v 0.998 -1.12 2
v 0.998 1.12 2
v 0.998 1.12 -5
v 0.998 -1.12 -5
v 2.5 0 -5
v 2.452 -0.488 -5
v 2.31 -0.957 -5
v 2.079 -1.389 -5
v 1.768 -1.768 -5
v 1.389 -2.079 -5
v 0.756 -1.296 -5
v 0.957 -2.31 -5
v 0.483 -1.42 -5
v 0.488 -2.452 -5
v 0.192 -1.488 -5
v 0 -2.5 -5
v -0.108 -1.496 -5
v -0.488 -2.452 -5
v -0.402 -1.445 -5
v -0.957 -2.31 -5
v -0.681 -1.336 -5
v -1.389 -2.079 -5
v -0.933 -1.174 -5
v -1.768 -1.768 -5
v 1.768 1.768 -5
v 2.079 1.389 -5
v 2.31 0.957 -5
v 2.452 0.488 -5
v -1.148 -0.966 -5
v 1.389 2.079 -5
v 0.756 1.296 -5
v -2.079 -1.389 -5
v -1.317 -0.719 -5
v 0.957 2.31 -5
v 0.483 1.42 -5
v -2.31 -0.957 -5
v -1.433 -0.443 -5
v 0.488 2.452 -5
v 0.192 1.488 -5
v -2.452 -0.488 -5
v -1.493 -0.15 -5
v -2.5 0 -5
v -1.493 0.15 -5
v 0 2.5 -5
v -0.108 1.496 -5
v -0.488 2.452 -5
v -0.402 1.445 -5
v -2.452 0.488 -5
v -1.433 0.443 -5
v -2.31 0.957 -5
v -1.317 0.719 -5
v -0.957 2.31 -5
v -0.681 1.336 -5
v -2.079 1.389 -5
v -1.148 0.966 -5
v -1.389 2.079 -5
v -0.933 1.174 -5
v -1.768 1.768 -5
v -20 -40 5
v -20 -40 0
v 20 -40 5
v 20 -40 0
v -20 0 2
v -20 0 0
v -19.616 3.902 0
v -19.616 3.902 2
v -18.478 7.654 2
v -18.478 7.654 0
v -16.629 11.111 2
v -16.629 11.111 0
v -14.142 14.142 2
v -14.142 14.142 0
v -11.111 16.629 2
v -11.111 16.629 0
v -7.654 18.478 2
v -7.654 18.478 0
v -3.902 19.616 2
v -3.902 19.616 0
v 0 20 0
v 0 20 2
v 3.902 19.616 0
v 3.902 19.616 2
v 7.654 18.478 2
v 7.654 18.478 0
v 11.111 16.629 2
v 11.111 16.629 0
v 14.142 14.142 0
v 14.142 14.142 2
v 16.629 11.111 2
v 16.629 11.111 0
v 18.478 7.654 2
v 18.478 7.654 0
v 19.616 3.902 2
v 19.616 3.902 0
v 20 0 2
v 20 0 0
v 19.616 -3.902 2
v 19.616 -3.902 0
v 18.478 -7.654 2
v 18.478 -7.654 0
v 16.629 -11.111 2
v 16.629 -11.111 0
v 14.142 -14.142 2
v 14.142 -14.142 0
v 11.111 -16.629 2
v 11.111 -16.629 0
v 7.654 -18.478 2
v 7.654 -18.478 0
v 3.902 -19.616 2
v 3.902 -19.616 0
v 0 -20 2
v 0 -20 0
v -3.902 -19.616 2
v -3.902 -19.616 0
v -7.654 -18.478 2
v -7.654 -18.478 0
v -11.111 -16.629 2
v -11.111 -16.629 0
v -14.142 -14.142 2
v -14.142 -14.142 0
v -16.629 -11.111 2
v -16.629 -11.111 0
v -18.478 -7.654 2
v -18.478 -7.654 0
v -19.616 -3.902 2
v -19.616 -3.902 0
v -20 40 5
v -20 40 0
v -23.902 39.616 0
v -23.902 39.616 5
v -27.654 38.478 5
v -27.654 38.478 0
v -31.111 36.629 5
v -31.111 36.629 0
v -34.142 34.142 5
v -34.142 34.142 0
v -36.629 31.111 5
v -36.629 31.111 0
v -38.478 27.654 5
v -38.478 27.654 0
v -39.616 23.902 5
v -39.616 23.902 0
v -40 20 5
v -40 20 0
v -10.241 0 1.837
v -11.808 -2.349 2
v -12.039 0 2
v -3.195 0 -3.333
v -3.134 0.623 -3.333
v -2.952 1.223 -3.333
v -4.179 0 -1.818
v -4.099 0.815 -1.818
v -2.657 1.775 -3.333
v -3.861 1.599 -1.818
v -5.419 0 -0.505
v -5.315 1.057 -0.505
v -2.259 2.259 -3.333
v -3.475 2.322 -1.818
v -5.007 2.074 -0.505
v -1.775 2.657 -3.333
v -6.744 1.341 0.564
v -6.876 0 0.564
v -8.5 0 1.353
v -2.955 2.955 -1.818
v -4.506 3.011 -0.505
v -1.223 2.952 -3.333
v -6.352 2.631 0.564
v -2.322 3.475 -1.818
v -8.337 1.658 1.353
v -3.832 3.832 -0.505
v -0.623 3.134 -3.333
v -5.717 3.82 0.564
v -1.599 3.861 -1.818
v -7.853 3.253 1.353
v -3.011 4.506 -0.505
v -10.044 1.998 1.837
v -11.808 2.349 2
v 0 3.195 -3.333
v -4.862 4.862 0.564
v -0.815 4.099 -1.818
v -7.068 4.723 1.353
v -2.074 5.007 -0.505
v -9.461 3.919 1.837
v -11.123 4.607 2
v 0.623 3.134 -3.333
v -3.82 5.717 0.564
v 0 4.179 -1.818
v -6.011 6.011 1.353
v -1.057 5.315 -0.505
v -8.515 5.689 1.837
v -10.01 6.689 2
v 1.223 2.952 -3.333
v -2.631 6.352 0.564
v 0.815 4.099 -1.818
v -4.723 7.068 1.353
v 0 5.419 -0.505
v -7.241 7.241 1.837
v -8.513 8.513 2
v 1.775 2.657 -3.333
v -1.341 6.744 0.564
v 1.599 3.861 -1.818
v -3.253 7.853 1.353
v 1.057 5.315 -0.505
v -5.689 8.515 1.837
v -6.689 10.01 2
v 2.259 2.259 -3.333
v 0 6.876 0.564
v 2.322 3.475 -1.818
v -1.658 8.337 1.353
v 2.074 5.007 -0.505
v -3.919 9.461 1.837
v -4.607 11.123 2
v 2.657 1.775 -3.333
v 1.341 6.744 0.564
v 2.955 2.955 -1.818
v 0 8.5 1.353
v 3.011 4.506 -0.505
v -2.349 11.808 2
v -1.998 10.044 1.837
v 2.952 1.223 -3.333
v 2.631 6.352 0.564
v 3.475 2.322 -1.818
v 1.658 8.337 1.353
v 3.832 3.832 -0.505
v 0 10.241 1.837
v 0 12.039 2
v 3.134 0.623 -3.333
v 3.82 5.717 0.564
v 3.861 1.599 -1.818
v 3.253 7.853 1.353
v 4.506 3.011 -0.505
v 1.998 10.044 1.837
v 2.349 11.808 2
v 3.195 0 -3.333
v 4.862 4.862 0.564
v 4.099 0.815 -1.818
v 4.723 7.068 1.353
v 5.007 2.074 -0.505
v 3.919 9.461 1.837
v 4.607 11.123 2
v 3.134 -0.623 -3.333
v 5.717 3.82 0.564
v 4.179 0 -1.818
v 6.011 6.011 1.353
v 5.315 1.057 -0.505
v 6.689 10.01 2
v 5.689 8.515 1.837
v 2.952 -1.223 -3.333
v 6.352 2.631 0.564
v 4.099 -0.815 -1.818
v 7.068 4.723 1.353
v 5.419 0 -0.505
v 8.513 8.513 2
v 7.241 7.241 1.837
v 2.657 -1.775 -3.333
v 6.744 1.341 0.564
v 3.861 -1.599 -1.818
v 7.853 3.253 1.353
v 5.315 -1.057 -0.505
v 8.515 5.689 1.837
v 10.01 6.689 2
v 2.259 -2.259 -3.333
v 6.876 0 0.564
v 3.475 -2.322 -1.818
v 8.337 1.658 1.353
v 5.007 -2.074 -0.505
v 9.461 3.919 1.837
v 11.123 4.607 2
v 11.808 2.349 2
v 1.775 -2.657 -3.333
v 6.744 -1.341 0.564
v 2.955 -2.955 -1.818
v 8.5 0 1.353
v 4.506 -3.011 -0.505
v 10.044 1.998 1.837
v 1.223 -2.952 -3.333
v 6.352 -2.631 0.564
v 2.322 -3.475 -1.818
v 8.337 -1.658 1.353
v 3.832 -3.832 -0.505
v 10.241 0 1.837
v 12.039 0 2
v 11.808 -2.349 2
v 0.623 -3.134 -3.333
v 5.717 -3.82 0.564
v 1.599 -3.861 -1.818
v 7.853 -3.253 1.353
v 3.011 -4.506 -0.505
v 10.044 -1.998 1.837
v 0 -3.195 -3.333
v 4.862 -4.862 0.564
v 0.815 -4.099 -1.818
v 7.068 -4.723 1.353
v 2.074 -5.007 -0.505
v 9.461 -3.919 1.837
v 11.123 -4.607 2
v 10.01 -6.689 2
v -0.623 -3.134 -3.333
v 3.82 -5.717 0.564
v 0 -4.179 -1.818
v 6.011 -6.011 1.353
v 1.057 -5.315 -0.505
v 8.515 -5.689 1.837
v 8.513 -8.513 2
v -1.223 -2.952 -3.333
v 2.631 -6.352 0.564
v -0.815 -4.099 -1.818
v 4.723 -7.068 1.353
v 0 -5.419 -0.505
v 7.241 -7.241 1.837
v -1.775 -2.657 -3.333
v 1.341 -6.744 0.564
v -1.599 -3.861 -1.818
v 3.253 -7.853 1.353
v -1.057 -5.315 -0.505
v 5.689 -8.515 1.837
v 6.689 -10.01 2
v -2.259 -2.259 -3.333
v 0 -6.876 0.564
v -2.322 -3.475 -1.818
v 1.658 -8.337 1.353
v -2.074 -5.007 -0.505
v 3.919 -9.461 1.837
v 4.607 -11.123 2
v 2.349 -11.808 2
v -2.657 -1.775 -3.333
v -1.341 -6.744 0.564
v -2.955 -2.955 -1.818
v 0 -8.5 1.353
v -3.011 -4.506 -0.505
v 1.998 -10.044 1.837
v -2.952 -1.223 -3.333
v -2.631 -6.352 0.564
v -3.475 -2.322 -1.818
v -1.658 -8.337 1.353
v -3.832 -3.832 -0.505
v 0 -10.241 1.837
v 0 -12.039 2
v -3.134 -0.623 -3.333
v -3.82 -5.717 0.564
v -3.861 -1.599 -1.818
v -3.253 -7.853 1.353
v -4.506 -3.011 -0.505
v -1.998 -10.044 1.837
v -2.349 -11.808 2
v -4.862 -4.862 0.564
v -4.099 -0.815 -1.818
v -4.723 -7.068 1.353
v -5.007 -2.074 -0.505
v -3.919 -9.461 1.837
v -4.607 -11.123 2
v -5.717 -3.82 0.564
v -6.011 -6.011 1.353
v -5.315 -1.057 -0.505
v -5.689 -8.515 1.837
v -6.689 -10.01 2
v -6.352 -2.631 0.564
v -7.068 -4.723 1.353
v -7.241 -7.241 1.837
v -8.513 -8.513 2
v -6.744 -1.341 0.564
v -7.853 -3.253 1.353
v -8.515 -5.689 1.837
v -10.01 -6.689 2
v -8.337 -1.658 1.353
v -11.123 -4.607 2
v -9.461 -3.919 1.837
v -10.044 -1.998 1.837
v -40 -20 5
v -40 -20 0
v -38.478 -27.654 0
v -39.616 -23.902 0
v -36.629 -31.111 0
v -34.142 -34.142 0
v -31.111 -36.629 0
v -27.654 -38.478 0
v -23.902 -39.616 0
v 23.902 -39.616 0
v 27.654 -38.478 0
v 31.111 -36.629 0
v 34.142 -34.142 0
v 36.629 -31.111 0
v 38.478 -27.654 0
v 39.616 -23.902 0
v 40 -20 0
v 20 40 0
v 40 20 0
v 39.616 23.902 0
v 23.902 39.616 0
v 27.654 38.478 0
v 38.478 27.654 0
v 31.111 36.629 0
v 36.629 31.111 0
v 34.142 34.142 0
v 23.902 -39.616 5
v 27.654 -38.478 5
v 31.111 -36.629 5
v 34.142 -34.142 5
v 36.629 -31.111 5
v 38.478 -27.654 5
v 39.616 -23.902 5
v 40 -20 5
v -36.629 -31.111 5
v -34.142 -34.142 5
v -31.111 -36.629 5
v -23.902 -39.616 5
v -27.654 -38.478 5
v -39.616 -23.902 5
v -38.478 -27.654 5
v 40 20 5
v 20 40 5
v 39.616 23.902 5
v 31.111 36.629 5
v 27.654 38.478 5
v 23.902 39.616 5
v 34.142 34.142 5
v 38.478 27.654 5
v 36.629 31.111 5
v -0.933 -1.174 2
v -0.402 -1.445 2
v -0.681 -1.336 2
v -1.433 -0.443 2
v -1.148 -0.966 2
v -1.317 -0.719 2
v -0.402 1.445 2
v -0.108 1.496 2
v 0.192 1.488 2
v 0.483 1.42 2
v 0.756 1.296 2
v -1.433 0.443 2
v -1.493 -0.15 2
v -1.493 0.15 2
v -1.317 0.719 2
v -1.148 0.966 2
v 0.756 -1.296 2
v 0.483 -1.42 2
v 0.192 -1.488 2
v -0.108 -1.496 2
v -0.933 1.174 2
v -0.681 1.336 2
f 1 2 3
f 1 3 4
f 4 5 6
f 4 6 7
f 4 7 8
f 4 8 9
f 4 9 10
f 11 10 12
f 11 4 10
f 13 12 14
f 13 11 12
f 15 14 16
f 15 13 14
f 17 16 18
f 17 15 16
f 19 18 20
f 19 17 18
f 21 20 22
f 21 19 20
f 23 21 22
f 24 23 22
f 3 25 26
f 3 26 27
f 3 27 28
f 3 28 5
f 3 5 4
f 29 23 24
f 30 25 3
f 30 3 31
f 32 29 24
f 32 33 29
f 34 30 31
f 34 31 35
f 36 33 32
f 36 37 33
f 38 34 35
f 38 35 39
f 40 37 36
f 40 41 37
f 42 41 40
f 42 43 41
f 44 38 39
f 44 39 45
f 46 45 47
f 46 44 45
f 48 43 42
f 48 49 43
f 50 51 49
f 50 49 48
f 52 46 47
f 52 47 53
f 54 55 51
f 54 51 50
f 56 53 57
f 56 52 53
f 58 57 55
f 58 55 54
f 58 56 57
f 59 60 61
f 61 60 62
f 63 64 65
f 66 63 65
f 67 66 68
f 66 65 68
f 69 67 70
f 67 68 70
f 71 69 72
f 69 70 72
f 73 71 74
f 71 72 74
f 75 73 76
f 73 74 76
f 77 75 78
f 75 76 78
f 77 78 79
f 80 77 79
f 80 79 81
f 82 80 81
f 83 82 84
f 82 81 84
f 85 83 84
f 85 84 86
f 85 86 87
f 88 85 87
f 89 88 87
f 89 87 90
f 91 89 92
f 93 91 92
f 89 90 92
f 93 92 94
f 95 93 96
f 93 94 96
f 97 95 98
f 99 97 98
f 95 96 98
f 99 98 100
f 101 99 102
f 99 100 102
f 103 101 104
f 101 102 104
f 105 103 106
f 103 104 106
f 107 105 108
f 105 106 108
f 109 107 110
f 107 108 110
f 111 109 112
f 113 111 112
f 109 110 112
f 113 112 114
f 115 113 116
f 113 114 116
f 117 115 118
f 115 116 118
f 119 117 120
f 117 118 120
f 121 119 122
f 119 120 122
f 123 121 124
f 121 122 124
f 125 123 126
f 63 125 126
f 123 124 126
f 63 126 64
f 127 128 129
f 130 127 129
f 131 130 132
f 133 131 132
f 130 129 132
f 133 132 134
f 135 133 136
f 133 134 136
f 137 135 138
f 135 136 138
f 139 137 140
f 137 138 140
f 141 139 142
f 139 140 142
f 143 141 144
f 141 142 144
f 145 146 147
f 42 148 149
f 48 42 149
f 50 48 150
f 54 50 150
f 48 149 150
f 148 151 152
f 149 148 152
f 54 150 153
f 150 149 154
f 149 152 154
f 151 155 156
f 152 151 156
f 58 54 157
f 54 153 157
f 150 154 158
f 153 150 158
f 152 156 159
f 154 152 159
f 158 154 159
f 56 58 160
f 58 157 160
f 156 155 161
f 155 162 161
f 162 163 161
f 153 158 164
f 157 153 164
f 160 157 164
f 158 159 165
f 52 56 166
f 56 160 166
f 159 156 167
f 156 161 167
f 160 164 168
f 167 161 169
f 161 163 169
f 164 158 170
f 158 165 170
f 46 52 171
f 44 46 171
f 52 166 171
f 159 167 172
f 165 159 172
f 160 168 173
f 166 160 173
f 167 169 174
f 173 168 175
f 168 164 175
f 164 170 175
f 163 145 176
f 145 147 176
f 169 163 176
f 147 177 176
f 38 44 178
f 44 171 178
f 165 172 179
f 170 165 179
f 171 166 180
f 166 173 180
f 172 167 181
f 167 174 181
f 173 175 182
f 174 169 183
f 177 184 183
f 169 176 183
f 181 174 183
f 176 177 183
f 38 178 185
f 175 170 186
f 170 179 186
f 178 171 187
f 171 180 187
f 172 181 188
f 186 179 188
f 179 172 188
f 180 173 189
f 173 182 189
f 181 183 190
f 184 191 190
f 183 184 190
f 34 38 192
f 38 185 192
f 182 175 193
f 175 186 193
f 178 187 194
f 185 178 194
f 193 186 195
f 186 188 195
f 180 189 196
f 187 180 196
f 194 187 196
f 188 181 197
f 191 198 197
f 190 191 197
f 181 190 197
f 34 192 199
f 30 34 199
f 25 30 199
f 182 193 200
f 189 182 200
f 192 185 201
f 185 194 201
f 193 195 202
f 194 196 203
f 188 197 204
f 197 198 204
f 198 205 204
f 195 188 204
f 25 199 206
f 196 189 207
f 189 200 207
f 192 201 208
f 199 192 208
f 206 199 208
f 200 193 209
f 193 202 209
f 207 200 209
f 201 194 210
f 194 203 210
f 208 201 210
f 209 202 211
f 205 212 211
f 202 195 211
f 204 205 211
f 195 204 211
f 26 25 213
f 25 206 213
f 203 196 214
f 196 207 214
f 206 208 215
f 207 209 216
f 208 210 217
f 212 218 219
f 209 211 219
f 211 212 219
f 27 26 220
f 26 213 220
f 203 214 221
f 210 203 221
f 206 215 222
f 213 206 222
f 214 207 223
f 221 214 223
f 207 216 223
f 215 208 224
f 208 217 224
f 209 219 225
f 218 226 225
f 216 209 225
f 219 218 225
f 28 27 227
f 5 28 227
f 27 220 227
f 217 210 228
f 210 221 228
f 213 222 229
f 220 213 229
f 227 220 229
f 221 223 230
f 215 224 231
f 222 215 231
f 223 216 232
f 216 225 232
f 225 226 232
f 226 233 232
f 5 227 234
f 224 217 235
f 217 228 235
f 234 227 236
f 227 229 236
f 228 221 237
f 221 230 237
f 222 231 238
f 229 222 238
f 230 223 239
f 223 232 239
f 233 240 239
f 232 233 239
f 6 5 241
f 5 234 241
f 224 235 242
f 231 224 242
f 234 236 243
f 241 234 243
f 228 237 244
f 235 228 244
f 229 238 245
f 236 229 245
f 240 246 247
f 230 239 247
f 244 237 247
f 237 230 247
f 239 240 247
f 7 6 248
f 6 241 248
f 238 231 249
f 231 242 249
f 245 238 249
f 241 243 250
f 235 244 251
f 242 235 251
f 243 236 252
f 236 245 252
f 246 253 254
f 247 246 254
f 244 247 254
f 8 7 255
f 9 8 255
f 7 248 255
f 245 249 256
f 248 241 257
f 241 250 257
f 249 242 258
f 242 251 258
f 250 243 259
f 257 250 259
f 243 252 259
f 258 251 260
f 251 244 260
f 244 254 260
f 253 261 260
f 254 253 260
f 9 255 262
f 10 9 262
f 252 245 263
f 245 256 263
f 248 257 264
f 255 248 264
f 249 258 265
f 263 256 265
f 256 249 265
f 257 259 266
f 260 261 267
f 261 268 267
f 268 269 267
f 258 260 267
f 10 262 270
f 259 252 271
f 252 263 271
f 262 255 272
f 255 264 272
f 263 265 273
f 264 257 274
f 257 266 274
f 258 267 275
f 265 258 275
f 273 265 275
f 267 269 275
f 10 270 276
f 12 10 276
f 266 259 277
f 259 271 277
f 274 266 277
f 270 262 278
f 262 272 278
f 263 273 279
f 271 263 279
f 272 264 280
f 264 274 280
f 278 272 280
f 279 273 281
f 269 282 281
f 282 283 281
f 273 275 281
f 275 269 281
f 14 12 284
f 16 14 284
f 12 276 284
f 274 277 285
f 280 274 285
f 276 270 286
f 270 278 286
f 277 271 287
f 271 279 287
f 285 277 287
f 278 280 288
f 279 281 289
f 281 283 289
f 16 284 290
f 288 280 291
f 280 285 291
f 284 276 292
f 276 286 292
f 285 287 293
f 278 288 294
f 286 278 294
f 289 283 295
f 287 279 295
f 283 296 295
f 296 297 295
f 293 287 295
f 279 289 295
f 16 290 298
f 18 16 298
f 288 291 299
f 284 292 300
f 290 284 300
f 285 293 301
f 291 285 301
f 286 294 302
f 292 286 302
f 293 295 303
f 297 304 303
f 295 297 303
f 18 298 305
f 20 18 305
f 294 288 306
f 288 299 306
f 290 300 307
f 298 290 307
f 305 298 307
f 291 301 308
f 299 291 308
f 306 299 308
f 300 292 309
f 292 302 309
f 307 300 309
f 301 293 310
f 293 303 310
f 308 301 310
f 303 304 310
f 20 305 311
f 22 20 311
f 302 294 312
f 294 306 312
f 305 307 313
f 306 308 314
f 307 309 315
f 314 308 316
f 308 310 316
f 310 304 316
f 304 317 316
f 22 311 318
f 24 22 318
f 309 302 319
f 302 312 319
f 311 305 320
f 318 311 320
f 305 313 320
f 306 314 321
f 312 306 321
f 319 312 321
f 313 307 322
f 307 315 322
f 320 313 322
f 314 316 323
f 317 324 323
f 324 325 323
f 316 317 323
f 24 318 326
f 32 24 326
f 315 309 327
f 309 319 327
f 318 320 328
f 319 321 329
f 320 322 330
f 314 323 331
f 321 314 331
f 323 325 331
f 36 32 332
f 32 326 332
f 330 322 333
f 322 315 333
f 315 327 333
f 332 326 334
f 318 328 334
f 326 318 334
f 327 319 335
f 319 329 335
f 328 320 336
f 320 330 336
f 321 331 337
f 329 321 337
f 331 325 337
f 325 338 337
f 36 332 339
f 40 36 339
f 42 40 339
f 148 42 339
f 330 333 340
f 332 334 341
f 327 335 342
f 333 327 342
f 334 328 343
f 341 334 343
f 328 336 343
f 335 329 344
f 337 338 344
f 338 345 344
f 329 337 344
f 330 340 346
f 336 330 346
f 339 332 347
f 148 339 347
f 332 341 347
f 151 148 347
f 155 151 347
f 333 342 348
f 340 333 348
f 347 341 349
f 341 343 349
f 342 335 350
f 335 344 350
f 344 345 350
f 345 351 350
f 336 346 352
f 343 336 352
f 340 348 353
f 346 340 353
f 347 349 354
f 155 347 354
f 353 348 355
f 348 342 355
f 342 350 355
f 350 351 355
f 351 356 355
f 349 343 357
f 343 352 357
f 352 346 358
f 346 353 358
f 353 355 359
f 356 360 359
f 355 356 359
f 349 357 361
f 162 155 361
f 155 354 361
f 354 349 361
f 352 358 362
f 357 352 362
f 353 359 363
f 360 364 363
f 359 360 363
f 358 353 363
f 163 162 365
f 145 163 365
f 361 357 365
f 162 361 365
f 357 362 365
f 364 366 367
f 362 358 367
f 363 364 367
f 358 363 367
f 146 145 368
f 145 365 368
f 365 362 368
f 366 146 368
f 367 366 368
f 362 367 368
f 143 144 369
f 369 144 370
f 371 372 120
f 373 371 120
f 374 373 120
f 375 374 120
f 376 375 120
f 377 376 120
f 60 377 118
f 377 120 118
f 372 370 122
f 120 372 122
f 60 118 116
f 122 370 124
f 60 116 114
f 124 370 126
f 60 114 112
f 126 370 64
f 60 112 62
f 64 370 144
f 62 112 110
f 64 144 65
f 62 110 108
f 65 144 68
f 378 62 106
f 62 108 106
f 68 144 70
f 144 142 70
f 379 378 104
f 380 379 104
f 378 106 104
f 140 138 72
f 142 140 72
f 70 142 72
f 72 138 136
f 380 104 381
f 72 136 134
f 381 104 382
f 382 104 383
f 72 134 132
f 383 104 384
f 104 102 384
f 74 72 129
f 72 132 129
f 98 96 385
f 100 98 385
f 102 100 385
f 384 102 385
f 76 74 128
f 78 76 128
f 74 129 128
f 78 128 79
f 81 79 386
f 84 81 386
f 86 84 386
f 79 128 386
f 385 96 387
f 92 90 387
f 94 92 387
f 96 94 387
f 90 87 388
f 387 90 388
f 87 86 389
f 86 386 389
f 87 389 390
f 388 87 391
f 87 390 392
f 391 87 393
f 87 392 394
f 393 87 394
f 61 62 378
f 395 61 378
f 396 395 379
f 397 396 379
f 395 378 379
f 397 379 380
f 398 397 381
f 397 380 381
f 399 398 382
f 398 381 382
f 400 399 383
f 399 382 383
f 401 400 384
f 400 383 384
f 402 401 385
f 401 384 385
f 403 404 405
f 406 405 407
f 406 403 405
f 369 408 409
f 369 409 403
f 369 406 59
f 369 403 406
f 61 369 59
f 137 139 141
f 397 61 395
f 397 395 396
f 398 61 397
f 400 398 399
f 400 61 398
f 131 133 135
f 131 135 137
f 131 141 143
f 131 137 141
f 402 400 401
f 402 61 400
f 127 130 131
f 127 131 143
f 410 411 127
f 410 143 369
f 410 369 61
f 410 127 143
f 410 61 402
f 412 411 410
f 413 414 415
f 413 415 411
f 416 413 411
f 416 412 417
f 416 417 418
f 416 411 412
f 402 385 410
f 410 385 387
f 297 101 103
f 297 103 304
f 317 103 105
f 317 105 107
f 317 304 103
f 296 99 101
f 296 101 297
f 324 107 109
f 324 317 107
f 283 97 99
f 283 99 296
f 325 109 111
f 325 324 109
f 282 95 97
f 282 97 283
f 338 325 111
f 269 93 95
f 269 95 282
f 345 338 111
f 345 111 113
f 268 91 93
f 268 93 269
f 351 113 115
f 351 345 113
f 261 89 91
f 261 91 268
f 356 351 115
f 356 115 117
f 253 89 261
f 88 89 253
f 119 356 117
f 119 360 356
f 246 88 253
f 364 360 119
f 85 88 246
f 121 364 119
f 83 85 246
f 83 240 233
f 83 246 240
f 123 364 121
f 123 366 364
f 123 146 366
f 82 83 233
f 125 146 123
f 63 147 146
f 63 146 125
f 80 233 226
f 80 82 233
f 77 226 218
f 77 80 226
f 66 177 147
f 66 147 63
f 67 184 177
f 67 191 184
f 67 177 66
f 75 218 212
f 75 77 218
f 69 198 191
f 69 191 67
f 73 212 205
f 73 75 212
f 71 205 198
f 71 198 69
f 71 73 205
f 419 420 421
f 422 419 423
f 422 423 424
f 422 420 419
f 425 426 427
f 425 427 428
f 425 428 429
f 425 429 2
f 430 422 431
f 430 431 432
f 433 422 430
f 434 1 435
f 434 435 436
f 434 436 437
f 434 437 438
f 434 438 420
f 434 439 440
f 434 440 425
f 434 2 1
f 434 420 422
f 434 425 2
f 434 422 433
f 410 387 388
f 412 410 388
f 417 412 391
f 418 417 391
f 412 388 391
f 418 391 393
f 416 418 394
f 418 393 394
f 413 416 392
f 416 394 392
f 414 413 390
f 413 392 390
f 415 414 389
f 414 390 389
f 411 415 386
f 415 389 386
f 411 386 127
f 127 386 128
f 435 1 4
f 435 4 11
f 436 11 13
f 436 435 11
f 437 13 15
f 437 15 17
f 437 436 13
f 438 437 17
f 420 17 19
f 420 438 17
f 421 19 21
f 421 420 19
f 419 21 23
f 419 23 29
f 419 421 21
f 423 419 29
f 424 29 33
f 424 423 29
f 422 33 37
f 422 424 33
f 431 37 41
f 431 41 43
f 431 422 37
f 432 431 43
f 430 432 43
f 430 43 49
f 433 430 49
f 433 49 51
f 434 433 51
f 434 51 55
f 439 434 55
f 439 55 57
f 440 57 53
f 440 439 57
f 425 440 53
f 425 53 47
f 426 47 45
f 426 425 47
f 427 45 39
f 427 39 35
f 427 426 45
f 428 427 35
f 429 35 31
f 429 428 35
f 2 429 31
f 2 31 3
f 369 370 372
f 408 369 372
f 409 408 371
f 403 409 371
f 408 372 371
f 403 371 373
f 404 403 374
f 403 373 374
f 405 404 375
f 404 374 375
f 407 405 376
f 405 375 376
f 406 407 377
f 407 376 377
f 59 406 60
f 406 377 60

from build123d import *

# Parameters (mm, degrees)
BOSS_EXTRUDE1_DEPTH = 5
SKETCH3_R           = 20
CUT_EXTRUDE2_DEPTH  = 2
SKETCH4_R           = 2.5
BOSS_EXTRUDE2_DEPTH = 7
FILLET1_R           = 10


with BuildPart() as part:
    # Sketch1 → Boss-Extrude1 (new body)
    with BuildSketch(Plane.XY):
        with BuildLine():
            Line((-20, -40), (20, -40))
            ThreePointArc((20, -40), (34.142135624, -34.142135624), (40, -20))
            Line((40, -20), (40, 20))
            ThreePointArc((40, 20), (34.142135624, 34.142135624), (20, 40))
            Line((20, 40), (-20, 40))
            ThreePointArc((-20, 40), (-34.142135624, 34.142135624), (-40, 20))
            Line((-40, 20), (-40, -20))
            ThreePointArc((-40, -20), (-34.142135624, -34.142135624), (-20, -40))
        make_face()
    extrude(amount=BOSS_EXTRUDE1_DEPTH)

    # Sketch3 → Cut-Extrude2 (cut)
    with BuildSketch(Plane(origin=(0, 0, 0), x_dir=(-1, 0, 0), z_dir=(0, 0, -1))):
        Circle(SKETCH3_R)
    extrude(amount=-CUT_EXTRUDE2_DEPTH, mode=Mode.SUBTRACT)

    # Sketch4 → Boss-Extrude2 (add)
    with BuildSketch(Plane(origin=(0, 0, 2), x_dir=(-1, 0, 0), z_dir=(0, 0, -1))):
        Circle(SKETCH4_R)
        with BuildLine():
            Line((-0.997797575, 1.12), (-0.997797575, -1.12))
            ThreePointArc((-0.997797575, -1.12), (1.5, 0), (-0.997797575, 1.12))
        make_face(mode=Mode.SUBTRACT)
    extrude(amount=BOSS_EXTRUDE2_DEPTH)

    # Fillet1
    # the kernel refuses this fillet: 10 mm, written as the material it adds along each edge
    with BuildSketch(Plane(origin=(0, 0, 2), x_dir=(-1, 0, 0), z_dir=(0, -1, 0))) as fillet1_piece_1:
        with BuildLine():
            CenterArc((12.039392014, 10), FILLET1_R, 197.457603124, 72.542396876)
            Line((2.5, 7), (2.30921216, 6.94))
            ThreePointArc((2.30921216, 6.94), (2.3, 3.5), (2.3, 0))
            Line((2.3, 0), (2.5, -0.2))
            Line((2.5, -0.2), (12.039392014, -0.2))
            Line((12.039392014, -0.2), (12.039392014, 0))
        make_face()
    revolve(axis=Axis((0, 0, 2), (0, 0, -1)))


solid = part.part
